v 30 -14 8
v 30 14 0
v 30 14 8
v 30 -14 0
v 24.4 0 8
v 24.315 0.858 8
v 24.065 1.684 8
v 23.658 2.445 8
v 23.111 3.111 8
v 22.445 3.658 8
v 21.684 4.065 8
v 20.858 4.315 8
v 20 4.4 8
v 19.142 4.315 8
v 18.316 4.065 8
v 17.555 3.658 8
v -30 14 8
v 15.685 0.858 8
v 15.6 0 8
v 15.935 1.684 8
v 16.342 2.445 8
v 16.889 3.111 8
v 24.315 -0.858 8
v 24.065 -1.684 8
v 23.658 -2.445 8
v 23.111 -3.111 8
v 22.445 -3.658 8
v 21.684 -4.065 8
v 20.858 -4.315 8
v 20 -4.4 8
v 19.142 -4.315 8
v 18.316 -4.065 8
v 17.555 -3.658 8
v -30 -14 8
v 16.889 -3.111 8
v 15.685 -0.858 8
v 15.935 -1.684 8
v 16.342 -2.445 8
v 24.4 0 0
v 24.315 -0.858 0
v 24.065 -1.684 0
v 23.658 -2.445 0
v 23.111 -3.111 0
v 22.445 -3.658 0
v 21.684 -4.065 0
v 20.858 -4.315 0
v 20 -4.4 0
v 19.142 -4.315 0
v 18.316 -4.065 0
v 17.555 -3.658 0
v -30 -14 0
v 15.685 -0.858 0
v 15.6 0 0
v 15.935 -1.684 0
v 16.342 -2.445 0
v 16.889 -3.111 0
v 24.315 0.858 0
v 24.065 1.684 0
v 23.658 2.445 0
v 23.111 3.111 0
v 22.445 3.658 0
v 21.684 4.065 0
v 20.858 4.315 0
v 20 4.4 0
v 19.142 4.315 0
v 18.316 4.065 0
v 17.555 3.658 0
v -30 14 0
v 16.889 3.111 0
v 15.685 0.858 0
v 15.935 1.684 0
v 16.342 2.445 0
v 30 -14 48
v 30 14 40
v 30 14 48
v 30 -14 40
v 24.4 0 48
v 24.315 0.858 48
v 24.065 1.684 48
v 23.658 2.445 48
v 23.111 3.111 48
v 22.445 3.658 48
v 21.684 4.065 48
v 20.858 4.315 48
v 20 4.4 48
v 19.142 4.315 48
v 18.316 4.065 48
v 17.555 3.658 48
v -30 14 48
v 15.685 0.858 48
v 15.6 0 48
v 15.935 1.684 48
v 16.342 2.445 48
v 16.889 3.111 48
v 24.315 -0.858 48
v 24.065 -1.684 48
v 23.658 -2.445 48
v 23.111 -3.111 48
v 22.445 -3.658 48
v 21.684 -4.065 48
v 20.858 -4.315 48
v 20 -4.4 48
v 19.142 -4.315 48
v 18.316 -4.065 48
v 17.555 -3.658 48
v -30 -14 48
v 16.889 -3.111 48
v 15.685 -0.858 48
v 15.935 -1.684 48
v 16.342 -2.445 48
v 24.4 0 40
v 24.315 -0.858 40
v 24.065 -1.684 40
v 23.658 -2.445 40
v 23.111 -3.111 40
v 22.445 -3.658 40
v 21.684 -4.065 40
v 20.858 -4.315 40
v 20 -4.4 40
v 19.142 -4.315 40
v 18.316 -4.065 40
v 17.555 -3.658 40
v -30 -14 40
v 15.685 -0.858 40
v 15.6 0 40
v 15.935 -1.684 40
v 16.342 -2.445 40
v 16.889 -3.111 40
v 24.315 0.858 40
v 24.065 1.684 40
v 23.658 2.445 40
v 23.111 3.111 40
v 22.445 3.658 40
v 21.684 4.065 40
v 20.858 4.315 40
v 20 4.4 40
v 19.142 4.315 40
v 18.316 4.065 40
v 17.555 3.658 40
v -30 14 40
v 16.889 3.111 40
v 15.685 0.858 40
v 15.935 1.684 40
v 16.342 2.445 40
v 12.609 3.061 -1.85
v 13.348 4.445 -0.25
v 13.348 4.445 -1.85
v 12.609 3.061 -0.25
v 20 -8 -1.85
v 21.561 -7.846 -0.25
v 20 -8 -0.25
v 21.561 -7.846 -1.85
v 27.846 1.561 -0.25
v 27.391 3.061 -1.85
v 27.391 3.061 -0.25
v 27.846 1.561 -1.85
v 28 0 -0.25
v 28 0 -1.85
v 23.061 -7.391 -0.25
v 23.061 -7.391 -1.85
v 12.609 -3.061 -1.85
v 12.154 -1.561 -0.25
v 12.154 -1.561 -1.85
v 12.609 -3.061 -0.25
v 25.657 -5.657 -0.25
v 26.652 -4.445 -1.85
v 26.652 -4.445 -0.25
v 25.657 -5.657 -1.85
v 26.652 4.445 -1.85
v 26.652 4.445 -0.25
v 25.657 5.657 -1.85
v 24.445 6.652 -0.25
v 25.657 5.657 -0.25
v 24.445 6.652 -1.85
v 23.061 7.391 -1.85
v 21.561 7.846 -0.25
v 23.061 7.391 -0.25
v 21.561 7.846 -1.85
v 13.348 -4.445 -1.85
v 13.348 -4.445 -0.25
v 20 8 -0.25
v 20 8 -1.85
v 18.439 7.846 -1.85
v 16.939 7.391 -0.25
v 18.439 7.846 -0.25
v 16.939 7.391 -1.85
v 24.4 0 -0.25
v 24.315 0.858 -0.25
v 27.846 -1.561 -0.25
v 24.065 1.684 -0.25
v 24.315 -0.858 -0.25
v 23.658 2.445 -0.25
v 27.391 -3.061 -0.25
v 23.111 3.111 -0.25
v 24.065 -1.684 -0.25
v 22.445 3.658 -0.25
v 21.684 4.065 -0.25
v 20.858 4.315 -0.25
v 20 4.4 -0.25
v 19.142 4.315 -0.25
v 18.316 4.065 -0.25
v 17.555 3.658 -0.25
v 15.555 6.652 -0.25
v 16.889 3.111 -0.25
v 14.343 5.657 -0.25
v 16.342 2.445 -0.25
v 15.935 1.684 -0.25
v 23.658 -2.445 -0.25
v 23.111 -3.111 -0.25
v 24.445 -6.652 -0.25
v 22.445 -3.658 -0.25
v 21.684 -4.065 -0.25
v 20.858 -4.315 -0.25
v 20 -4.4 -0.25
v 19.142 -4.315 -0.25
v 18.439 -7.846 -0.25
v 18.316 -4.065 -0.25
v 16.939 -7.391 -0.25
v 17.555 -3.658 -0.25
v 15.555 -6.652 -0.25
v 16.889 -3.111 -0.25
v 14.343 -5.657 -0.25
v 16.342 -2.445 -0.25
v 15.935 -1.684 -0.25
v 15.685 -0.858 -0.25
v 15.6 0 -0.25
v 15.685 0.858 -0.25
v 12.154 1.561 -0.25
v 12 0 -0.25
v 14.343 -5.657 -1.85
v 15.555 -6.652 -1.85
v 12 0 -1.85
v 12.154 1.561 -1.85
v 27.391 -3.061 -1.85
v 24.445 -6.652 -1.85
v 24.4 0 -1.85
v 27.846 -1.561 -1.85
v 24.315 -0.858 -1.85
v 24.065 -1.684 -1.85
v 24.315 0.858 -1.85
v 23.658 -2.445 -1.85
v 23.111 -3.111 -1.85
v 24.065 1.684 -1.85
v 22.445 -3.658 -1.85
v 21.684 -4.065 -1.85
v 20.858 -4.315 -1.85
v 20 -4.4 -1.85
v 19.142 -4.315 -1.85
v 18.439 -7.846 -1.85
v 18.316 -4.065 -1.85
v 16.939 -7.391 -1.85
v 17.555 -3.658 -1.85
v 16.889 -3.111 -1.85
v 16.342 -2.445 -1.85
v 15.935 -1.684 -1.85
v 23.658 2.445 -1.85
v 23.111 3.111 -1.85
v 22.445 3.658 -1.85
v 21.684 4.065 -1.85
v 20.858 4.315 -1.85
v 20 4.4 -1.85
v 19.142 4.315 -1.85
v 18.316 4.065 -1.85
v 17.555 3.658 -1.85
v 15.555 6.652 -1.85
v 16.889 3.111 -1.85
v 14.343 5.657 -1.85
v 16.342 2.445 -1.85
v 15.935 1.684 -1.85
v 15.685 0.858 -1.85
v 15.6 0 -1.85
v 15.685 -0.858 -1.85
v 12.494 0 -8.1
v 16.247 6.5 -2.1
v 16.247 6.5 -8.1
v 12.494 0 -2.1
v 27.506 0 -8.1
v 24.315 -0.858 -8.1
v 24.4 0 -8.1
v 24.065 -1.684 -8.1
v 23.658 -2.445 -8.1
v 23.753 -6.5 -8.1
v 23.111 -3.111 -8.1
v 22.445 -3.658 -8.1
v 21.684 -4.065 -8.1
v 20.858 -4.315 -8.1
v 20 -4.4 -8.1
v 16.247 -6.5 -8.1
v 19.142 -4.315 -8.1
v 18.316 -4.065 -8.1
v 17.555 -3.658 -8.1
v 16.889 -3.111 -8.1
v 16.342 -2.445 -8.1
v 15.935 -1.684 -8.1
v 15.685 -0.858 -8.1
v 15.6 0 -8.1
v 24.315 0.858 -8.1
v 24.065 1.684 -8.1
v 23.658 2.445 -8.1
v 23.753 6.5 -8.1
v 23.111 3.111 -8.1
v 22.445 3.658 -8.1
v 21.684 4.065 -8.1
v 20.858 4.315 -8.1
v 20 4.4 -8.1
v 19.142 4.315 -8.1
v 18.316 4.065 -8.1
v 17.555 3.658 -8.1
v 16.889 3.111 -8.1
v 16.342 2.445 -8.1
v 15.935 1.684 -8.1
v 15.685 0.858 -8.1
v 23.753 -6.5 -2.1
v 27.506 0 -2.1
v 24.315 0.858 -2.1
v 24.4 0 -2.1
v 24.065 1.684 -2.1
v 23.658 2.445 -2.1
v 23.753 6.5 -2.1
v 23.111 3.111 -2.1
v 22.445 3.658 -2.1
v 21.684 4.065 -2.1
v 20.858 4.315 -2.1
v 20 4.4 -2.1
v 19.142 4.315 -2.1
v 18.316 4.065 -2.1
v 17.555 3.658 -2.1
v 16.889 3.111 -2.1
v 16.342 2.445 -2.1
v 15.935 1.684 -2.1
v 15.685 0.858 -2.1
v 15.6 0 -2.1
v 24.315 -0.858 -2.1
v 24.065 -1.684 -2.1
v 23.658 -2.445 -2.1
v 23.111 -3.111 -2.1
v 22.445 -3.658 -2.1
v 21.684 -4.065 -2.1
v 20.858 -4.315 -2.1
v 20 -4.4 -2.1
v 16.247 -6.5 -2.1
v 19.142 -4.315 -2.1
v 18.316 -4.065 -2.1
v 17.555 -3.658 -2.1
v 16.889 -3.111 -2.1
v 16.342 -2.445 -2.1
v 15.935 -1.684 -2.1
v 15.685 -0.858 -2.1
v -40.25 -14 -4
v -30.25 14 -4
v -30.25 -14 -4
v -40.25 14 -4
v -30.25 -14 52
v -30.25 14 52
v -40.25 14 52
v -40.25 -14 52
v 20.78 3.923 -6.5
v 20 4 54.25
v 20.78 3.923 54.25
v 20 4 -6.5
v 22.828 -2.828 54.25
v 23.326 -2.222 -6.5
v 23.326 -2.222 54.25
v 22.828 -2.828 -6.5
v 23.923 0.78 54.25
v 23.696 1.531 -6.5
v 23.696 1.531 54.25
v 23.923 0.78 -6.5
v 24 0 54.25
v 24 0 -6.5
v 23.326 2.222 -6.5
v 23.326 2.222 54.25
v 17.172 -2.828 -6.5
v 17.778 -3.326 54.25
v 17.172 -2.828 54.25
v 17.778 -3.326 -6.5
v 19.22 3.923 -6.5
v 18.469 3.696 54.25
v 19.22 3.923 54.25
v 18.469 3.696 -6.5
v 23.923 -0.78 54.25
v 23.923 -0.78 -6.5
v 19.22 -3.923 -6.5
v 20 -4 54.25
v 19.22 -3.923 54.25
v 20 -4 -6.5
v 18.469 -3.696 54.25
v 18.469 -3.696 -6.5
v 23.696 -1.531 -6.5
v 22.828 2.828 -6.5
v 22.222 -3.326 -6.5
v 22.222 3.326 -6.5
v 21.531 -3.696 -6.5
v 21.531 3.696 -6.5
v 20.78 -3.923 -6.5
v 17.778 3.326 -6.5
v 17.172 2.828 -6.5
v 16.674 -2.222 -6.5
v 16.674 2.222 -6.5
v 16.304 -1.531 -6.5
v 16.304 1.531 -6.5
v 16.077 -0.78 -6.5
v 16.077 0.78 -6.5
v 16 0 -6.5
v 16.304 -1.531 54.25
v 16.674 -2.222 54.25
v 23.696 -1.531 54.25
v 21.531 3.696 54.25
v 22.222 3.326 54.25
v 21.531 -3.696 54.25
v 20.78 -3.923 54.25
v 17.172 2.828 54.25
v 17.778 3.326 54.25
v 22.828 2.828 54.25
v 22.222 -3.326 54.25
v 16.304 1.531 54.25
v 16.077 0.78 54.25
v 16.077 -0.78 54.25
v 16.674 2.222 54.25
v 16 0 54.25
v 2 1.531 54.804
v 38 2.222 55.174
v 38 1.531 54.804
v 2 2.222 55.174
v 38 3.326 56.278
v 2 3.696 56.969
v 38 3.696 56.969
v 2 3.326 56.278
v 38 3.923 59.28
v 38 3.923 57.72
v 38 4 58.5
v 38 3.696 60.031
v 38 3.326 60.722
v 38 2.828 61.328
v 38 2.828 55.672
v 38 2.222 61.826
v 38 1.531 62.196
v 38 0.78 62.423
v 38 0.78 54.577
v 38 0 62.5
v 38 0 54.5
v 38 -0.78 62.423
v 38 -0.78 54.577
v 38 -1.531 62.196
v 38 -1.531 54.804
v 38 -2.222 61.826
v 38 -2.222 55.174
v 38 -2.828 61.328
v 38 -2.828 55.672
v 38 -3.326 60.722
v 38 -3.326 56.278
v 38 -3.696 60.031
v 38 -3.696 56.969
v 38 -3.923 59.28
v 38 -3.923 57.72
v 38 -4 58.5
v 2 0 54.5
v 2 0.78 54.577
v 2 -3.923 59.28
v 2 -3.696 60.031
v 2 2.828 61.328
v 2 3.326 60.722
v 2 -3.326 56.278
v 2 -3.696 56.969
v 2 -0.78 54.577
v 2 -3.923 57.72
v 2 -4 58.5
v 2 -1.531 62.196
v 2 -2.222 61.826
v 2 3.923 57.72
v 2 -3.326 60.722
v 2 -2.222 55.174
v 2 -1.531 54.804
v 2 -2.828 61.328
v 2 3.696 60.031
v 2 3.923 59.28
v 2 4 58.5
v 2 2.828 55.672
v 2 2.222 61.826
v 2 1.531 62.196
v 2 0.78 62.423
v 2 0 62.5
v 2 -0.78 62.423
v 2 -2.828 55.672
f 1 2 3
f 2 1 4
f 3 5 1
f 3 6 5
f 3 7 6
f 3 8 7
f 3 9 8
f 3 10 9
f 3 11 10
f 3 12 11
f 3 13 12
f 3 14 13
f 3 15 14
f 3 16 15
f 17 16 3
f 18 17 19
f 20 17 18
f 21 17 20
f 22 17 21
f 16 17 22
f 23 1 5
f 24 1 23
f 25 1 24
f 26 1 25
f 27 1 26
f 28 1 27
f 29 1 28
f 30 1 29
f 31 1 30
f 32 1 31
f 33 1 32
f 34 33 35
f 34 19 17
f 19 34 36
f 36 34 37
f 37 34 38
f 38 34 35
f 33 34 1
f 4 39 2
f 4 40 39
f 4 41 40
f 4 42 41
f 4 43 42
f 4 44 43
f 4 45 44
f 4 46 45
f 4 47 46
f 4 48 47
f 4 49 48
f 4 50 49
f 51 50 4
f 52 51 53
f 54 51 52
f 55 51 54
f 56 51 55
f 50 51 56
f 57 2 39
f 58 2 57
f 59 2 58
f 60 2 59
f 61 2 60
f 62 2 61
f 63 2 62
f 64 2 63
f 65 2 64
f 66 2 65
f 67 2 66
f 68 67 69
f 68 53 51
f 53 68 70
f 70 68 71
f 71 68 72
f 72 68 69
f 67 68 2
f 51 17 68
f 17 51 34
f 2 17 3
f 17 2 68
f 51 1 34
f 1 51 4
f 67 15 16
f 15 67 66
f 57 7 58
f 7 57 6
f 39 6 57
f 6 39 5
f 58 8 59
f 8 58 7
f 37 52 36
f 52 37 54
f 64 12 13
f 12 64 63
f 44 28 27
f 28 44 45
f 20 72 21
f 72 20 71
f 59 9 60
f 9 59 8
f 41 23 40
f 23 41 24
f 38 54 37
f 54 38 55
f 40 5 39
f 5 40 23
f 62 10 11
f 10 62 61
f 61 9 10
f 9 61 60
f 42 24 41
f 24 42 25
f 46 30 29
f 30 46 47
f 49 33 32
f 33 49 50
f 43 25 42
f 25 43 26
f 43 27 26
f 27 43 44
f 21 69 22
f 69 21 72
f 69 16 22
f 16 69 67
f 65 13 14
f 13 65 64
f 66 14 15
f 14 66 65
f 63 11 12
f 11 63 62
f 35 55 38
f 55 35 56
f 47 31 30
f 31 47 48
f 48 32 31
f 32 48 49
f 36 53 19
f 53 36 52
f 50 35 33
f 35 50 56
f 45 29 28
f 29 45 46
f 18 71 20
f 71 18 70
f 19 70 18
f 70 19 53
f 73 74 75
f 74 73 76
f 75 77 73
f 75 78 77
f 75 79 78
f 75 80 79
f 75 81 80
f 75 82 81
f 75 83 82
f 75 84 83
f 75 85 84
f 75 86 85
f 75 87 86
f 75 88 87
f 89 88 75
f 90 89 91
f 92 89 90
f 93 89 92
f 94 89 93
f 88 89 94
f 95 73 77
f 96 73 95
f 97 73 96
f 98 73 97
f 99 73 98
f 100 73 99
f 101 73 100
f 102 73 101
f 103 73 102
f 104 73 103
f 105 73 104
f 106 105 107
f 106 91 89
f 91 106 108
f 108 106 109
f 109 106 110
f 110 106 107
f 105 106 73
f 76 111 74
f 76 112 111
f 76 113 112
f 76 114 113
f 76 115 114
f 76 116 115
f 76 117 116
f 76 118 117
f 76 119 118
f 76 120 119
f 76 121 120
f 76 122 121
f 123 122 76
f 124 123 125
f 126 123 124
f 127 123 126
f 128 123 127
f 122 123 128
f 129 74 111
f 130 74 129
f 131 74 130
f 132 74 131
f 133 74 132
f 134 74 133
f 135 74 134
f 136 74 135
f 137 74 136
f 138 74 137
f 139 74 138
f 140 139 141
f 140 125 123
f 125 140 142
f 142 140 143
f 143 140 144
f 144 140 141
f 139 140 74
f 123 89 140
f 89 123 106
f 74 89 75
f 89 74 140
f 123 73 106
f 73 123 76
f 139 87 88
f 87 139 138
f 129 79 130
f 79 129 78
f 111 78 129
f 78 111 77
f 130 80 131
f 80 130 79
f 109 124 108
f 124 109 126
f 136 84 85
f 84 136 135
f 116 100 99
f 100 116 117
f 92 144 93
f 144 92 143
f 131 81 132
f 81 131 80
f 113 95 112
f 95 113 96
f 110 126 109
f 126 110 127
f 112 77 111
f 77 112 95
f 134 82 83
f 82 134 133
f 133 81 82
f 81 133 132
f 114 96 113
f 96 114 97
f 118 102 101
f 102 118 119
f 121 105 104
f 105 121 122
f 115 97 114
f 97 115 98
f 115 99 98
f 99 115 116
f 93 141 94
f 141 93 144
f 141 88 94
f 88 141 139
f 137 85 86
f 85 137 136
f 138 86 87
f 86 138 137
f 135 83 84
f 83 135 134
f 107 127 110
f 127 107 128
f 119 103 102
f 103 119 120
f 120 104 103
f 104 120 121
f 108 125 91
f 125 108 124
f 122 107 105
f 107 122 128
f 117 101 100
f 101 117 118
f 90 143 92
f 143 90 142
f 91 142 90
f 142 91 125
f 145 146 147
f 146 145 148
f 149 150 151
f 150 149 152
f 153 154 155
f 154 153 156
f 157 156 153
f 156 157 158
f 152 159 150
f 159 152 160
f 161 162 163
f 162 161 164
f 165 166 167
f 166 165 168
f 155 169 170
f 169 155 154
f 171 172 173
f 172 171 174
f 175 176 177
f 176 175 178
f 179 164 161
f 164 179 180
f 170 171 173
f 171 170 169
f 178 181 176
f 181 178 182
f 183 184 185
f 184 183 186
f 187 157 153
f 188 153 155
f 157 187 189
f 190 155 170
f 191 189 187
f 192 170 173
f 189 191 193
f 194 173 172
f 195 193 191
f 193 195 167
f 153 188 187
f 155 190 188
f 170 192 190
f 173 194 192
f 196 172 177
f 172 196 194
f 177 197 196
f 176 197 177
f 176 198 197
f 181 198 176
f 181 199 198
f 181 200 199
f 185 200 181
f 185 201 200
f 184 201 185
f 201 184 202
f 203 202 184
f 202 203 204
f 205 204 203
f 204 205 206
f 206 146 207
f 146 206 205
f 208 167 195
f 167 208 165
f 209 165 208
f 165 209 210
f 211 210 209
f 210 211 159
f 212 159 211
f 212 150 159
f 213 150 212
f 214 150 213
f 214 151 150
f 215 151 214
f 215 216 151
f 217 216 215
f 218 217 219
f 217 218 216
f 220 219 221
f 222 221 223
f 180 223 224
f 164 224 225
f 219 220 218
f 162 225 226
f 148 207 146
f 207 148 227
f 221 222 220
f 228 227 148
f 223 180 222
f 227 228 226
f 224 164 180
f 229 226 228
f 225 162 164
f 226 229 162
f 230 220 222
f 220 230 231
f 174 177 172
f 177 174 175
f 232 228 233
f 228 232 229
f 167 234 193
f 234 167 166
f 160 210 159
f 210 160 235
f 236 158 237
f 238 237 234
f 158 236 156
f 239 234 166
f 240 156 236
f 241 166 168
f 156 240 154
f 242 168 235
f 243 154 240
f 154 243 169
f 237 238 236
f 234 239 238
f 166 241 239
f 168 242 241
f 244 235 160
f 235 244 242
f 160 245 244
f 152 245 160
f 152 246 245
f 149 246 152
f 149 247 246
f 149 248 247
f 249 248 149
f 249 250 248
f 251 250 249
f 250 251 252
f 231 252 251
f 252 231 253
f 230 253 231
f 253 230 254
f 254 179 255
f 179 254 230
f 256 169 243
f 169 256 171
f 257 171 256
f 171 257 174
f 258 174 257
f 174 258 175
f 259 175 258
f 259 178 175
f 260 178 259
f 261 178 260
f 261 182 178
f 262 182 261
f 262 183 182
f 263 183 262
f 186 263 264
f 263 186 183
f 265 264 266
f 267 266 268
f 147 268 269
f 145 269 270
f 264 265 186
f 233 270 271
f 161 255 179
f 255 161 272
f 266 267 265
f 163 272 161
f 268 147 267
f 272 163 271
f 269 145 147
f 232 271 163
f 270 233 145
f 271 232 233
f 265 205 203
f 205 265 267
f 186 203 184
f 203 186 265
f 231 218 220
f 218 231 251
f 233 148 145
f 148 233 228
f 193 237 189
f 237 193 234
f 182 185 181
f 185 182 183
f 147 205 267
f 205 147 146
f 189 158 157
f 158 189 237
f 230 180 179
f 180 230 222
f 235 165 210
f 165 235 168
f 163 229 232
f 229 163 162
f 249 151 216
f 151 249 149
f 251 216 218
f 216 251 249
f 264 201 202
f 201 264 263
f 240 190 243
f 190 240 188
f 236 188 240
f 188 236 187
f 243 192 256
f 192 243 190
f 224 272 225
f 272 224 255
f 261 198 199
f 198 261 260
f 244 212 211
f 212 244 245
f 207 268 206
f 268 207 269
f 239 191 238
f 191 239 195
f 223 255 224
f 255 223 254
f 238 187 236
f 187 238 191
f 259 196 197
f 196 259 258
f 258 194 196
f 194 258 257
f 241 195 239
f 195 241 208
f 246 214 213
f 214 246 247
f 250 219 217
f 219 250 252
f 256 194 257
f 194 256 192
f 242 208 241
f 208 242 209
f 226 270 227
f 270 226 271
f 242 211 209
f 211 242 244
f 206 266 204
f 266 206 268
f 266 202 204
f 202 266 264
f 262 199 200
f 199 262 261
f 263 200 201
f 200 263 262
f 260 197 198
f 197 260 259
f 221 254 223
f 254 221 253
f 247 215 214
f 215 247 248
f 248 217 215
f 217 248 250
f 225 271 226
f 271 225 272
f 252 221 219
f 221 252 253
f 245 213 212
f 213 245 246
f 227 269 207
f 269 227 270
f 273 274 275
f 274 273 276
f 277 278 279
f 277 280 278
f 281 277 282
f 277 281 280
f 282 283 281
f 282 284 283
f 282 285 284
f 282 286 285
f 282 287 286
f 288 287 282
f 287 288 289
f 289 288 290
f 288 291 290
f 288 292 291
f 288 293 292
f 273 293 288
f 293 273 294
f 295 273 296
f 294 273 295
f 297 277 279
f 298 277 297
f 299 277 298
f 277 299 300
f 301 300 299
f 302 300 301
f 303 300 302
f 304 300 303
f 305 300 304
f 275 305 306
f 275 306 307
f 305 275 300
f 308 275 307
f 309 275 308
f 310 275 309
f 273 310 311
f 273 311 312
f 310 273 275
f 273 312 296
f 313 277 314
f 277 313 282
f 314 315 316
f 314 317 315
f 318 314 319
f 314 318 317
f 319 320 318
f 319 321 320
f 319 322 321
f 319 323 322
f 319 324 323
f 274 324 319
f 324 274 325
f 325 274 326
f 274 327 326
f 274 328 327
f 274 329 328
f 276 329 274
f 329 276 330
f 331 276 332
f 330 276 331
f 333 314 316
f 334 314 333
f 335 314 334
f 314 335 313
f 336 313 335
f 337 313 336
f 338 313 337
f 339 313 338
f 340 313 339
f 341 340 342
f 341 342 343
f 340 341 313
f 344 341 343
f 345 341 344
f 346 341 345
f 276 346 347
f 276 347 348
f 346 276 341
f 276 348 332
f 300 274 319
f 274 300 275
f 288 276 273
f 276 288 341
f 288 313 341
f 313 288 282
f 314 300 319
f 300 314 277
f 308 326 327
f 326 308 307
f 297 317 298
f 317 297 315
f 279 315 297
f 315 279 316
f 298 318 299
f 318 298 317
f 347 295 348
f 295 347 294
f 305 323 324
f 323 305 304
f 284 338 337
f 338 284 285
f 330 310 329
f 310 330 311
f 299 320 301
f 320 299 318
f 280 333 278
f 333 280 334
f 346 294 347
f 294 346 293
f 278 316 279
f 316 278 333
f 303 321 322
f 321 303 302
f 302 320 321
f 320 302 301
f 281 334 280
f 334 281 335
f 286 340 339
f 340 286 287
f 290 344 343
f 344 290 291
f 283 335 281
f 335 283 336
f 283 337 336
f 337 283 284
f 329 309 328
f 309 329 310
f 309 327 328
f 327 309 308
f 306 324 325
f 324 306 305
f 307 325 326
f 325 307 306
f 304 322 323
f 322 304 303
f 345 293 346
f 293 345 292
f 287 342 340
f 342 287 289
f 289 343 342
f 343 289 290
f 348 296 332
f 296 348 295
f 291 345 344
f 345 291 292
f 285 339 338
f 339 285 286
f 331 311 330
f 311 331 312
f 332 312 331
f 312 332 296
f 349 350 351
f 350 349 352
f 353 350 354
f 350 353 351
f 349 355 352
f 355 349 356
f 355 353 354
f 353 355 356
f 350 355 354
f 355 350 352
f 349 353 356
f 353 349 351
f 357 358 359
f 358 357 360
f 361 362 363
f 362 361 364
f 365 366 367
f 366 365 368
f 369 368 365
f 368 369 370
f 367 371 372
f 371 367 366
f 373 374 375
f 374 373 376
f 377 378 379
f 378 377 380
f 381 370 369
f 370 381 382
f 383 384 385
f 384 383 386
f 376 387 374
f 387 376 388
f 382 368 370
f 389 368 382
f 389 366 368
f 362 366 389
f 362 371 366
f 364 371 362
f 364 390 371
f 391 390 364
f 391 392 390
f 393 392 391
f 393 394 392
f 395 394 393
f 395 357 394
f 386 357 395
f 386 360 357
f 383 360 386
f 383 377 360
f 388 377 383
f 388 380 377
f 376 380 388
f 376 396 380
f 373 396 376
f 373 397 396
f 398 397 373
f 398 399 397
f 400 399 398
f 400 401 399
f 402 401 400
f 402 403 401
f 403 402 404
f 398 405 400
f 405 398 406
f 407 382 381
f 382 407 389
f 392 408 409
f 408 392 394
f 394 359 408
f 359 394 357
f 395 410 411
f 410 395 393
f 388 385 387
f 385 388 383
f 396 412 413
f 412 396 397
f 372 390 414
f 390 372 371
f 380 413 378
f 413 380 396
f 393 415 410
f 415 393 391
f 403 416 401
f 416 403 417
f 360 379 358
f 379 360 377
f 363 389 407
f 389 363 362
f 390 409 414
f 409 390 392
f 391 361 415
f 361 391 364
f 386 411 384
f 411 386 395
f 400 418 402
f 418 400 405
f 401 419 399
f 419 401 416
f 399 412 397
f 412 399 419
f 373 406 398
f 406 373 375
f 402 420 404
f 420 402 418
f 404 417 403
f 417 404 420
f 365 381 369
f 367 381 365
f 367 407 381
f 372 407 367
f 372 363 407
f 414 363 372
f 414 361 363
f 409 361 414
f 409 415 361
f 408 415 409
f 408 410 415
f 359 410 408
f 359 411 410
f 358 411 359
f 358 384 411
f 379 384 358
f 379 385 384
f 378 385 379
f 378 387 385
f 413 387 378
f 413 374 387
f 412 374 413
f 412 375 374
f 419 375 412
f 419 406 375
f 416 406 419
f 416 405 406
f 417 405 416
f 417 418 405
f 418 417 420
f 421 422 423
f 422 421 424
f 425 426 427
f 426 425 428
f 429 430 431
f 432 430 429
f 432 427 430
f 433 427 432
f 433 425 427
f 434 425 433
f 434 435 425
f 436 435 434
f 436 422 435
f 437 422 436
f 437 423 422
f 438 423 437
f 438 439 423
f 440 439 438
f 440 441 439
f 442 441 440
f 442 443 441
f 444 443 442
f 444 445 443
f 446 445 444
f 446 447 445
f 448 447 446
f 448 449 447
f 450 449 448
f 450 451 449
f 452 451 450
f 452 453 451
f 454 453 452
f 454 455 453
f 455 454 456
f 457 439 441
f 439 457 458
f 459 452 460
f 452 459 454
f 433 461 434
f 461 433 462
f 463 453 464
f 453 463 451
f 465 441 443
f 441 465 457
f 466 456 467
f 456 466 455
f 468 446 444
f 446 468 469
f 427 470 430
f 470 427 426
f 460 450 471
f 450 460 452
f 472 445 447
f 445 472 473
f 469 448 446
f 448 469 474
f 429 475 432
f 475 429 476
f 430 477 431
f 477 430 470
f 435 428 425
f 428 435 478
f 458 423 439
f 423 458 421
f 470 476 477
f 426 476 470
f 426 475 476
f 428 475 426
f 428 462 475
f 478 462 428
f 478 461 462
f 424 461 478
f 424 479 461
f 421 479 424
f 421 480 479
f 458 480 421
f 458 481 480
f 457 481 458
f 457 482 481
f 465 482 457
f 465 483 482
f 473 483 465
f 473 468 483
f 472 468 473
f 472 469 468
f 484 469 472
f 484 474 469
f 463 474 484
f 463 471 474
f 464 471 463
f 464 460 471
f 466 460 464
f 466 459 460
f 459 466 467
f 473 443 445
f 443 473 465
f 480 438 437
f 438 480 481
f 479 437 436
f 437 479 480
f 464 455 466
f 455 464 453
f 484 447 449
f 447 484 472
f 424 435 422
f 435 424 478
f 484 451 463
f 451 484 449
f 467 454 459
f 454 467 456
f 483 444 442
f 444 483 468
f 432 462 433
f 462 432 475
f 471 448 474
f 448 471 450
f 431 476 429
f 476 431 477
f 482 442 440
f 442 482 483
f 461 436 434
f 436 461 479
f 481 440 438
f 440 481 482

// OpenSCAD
$fn = 32;

// ------------------------------------------------------------------------
// C clamp: throat 40 mm, screw d8
// Every part is its own module, assembly() places every instance.
// ------------------------------------------------------------------------

// --- part 1 ---
module clamp_arm() {
  difference() {
    translate([-30, -14, 0]) cube([60, 28, 8]);
    translate([20, 0, -1]) cylinder(h = 10, d = 8.8);
  }
}

// --- part 2 ---
module clamp_spine() {
  difference() {
    translate([-28, -14, 0]) cube([56, 28, 10]);
  }
}

// --- part 3 ---
module clamp_screw() {
  translate([0, 0, -30.375]) cylinder(h = 60.75, d = 8);
}

// --- part 4 ---
module clamp_washer() {
  difference() {
      translate([0, 0, 0]) cylinder(h = 1.6, d = 16);
      translate([0, 0, -1]) cylinder(h = 3.6, d = 8.8);
    }
}

// --- part 5 ---
module clamp_nut() {
  difference() {
    linear_extrude(height = 6) polygon(points = [[7.506, 0], [3.753, 6.5], [-3.753, 6.5], [-7.506, 0], [-3.753, -6.5], [3.753, -6.5]]);
    translate([0, 0, -1]) cylinder(h = 8, d = 8.8);
  }
}

// --- part 6 ---
module tommy_bar() {
  translate([0, 0, -18]) cylinder(h = 36, d = 8);
}

// --- assembly ---
module assembly() {
  color([0.80, 0.24, 0.20]) translate([0, 0, 0]) rotate([0, 0, 0]) clamp_arm();
  color([0.20, 0.45, 0.75]) translate([0, 0, 40]) rotate([0, 0, 0]) clamp_arm();
  color([0.25, 0.62, 0.32]) translate([-40.25, 0, 24]) rotate([0, 90, 0]) clamp_spine();
  color([0.92, 0.70, 0.18]) translate([20, 0, 23.875]) rotate([0, 0, 0]) clamp_screw();
  color([0.58, 0.35, 0.70]) translate([20, 0, -1.85]) rotate([0, 0, 0]) clamp_washer();
  color([0.16, 0.66, 0.66]) translate([20, 0, -8.1]) rotate([0, 0, 0]) clamp_nut();
  color([0.85, 0.48, 0.18]) translate([20, 0, 58.5]) rotate([0, 90, 0]) tommy_bar();
}

assembly();
